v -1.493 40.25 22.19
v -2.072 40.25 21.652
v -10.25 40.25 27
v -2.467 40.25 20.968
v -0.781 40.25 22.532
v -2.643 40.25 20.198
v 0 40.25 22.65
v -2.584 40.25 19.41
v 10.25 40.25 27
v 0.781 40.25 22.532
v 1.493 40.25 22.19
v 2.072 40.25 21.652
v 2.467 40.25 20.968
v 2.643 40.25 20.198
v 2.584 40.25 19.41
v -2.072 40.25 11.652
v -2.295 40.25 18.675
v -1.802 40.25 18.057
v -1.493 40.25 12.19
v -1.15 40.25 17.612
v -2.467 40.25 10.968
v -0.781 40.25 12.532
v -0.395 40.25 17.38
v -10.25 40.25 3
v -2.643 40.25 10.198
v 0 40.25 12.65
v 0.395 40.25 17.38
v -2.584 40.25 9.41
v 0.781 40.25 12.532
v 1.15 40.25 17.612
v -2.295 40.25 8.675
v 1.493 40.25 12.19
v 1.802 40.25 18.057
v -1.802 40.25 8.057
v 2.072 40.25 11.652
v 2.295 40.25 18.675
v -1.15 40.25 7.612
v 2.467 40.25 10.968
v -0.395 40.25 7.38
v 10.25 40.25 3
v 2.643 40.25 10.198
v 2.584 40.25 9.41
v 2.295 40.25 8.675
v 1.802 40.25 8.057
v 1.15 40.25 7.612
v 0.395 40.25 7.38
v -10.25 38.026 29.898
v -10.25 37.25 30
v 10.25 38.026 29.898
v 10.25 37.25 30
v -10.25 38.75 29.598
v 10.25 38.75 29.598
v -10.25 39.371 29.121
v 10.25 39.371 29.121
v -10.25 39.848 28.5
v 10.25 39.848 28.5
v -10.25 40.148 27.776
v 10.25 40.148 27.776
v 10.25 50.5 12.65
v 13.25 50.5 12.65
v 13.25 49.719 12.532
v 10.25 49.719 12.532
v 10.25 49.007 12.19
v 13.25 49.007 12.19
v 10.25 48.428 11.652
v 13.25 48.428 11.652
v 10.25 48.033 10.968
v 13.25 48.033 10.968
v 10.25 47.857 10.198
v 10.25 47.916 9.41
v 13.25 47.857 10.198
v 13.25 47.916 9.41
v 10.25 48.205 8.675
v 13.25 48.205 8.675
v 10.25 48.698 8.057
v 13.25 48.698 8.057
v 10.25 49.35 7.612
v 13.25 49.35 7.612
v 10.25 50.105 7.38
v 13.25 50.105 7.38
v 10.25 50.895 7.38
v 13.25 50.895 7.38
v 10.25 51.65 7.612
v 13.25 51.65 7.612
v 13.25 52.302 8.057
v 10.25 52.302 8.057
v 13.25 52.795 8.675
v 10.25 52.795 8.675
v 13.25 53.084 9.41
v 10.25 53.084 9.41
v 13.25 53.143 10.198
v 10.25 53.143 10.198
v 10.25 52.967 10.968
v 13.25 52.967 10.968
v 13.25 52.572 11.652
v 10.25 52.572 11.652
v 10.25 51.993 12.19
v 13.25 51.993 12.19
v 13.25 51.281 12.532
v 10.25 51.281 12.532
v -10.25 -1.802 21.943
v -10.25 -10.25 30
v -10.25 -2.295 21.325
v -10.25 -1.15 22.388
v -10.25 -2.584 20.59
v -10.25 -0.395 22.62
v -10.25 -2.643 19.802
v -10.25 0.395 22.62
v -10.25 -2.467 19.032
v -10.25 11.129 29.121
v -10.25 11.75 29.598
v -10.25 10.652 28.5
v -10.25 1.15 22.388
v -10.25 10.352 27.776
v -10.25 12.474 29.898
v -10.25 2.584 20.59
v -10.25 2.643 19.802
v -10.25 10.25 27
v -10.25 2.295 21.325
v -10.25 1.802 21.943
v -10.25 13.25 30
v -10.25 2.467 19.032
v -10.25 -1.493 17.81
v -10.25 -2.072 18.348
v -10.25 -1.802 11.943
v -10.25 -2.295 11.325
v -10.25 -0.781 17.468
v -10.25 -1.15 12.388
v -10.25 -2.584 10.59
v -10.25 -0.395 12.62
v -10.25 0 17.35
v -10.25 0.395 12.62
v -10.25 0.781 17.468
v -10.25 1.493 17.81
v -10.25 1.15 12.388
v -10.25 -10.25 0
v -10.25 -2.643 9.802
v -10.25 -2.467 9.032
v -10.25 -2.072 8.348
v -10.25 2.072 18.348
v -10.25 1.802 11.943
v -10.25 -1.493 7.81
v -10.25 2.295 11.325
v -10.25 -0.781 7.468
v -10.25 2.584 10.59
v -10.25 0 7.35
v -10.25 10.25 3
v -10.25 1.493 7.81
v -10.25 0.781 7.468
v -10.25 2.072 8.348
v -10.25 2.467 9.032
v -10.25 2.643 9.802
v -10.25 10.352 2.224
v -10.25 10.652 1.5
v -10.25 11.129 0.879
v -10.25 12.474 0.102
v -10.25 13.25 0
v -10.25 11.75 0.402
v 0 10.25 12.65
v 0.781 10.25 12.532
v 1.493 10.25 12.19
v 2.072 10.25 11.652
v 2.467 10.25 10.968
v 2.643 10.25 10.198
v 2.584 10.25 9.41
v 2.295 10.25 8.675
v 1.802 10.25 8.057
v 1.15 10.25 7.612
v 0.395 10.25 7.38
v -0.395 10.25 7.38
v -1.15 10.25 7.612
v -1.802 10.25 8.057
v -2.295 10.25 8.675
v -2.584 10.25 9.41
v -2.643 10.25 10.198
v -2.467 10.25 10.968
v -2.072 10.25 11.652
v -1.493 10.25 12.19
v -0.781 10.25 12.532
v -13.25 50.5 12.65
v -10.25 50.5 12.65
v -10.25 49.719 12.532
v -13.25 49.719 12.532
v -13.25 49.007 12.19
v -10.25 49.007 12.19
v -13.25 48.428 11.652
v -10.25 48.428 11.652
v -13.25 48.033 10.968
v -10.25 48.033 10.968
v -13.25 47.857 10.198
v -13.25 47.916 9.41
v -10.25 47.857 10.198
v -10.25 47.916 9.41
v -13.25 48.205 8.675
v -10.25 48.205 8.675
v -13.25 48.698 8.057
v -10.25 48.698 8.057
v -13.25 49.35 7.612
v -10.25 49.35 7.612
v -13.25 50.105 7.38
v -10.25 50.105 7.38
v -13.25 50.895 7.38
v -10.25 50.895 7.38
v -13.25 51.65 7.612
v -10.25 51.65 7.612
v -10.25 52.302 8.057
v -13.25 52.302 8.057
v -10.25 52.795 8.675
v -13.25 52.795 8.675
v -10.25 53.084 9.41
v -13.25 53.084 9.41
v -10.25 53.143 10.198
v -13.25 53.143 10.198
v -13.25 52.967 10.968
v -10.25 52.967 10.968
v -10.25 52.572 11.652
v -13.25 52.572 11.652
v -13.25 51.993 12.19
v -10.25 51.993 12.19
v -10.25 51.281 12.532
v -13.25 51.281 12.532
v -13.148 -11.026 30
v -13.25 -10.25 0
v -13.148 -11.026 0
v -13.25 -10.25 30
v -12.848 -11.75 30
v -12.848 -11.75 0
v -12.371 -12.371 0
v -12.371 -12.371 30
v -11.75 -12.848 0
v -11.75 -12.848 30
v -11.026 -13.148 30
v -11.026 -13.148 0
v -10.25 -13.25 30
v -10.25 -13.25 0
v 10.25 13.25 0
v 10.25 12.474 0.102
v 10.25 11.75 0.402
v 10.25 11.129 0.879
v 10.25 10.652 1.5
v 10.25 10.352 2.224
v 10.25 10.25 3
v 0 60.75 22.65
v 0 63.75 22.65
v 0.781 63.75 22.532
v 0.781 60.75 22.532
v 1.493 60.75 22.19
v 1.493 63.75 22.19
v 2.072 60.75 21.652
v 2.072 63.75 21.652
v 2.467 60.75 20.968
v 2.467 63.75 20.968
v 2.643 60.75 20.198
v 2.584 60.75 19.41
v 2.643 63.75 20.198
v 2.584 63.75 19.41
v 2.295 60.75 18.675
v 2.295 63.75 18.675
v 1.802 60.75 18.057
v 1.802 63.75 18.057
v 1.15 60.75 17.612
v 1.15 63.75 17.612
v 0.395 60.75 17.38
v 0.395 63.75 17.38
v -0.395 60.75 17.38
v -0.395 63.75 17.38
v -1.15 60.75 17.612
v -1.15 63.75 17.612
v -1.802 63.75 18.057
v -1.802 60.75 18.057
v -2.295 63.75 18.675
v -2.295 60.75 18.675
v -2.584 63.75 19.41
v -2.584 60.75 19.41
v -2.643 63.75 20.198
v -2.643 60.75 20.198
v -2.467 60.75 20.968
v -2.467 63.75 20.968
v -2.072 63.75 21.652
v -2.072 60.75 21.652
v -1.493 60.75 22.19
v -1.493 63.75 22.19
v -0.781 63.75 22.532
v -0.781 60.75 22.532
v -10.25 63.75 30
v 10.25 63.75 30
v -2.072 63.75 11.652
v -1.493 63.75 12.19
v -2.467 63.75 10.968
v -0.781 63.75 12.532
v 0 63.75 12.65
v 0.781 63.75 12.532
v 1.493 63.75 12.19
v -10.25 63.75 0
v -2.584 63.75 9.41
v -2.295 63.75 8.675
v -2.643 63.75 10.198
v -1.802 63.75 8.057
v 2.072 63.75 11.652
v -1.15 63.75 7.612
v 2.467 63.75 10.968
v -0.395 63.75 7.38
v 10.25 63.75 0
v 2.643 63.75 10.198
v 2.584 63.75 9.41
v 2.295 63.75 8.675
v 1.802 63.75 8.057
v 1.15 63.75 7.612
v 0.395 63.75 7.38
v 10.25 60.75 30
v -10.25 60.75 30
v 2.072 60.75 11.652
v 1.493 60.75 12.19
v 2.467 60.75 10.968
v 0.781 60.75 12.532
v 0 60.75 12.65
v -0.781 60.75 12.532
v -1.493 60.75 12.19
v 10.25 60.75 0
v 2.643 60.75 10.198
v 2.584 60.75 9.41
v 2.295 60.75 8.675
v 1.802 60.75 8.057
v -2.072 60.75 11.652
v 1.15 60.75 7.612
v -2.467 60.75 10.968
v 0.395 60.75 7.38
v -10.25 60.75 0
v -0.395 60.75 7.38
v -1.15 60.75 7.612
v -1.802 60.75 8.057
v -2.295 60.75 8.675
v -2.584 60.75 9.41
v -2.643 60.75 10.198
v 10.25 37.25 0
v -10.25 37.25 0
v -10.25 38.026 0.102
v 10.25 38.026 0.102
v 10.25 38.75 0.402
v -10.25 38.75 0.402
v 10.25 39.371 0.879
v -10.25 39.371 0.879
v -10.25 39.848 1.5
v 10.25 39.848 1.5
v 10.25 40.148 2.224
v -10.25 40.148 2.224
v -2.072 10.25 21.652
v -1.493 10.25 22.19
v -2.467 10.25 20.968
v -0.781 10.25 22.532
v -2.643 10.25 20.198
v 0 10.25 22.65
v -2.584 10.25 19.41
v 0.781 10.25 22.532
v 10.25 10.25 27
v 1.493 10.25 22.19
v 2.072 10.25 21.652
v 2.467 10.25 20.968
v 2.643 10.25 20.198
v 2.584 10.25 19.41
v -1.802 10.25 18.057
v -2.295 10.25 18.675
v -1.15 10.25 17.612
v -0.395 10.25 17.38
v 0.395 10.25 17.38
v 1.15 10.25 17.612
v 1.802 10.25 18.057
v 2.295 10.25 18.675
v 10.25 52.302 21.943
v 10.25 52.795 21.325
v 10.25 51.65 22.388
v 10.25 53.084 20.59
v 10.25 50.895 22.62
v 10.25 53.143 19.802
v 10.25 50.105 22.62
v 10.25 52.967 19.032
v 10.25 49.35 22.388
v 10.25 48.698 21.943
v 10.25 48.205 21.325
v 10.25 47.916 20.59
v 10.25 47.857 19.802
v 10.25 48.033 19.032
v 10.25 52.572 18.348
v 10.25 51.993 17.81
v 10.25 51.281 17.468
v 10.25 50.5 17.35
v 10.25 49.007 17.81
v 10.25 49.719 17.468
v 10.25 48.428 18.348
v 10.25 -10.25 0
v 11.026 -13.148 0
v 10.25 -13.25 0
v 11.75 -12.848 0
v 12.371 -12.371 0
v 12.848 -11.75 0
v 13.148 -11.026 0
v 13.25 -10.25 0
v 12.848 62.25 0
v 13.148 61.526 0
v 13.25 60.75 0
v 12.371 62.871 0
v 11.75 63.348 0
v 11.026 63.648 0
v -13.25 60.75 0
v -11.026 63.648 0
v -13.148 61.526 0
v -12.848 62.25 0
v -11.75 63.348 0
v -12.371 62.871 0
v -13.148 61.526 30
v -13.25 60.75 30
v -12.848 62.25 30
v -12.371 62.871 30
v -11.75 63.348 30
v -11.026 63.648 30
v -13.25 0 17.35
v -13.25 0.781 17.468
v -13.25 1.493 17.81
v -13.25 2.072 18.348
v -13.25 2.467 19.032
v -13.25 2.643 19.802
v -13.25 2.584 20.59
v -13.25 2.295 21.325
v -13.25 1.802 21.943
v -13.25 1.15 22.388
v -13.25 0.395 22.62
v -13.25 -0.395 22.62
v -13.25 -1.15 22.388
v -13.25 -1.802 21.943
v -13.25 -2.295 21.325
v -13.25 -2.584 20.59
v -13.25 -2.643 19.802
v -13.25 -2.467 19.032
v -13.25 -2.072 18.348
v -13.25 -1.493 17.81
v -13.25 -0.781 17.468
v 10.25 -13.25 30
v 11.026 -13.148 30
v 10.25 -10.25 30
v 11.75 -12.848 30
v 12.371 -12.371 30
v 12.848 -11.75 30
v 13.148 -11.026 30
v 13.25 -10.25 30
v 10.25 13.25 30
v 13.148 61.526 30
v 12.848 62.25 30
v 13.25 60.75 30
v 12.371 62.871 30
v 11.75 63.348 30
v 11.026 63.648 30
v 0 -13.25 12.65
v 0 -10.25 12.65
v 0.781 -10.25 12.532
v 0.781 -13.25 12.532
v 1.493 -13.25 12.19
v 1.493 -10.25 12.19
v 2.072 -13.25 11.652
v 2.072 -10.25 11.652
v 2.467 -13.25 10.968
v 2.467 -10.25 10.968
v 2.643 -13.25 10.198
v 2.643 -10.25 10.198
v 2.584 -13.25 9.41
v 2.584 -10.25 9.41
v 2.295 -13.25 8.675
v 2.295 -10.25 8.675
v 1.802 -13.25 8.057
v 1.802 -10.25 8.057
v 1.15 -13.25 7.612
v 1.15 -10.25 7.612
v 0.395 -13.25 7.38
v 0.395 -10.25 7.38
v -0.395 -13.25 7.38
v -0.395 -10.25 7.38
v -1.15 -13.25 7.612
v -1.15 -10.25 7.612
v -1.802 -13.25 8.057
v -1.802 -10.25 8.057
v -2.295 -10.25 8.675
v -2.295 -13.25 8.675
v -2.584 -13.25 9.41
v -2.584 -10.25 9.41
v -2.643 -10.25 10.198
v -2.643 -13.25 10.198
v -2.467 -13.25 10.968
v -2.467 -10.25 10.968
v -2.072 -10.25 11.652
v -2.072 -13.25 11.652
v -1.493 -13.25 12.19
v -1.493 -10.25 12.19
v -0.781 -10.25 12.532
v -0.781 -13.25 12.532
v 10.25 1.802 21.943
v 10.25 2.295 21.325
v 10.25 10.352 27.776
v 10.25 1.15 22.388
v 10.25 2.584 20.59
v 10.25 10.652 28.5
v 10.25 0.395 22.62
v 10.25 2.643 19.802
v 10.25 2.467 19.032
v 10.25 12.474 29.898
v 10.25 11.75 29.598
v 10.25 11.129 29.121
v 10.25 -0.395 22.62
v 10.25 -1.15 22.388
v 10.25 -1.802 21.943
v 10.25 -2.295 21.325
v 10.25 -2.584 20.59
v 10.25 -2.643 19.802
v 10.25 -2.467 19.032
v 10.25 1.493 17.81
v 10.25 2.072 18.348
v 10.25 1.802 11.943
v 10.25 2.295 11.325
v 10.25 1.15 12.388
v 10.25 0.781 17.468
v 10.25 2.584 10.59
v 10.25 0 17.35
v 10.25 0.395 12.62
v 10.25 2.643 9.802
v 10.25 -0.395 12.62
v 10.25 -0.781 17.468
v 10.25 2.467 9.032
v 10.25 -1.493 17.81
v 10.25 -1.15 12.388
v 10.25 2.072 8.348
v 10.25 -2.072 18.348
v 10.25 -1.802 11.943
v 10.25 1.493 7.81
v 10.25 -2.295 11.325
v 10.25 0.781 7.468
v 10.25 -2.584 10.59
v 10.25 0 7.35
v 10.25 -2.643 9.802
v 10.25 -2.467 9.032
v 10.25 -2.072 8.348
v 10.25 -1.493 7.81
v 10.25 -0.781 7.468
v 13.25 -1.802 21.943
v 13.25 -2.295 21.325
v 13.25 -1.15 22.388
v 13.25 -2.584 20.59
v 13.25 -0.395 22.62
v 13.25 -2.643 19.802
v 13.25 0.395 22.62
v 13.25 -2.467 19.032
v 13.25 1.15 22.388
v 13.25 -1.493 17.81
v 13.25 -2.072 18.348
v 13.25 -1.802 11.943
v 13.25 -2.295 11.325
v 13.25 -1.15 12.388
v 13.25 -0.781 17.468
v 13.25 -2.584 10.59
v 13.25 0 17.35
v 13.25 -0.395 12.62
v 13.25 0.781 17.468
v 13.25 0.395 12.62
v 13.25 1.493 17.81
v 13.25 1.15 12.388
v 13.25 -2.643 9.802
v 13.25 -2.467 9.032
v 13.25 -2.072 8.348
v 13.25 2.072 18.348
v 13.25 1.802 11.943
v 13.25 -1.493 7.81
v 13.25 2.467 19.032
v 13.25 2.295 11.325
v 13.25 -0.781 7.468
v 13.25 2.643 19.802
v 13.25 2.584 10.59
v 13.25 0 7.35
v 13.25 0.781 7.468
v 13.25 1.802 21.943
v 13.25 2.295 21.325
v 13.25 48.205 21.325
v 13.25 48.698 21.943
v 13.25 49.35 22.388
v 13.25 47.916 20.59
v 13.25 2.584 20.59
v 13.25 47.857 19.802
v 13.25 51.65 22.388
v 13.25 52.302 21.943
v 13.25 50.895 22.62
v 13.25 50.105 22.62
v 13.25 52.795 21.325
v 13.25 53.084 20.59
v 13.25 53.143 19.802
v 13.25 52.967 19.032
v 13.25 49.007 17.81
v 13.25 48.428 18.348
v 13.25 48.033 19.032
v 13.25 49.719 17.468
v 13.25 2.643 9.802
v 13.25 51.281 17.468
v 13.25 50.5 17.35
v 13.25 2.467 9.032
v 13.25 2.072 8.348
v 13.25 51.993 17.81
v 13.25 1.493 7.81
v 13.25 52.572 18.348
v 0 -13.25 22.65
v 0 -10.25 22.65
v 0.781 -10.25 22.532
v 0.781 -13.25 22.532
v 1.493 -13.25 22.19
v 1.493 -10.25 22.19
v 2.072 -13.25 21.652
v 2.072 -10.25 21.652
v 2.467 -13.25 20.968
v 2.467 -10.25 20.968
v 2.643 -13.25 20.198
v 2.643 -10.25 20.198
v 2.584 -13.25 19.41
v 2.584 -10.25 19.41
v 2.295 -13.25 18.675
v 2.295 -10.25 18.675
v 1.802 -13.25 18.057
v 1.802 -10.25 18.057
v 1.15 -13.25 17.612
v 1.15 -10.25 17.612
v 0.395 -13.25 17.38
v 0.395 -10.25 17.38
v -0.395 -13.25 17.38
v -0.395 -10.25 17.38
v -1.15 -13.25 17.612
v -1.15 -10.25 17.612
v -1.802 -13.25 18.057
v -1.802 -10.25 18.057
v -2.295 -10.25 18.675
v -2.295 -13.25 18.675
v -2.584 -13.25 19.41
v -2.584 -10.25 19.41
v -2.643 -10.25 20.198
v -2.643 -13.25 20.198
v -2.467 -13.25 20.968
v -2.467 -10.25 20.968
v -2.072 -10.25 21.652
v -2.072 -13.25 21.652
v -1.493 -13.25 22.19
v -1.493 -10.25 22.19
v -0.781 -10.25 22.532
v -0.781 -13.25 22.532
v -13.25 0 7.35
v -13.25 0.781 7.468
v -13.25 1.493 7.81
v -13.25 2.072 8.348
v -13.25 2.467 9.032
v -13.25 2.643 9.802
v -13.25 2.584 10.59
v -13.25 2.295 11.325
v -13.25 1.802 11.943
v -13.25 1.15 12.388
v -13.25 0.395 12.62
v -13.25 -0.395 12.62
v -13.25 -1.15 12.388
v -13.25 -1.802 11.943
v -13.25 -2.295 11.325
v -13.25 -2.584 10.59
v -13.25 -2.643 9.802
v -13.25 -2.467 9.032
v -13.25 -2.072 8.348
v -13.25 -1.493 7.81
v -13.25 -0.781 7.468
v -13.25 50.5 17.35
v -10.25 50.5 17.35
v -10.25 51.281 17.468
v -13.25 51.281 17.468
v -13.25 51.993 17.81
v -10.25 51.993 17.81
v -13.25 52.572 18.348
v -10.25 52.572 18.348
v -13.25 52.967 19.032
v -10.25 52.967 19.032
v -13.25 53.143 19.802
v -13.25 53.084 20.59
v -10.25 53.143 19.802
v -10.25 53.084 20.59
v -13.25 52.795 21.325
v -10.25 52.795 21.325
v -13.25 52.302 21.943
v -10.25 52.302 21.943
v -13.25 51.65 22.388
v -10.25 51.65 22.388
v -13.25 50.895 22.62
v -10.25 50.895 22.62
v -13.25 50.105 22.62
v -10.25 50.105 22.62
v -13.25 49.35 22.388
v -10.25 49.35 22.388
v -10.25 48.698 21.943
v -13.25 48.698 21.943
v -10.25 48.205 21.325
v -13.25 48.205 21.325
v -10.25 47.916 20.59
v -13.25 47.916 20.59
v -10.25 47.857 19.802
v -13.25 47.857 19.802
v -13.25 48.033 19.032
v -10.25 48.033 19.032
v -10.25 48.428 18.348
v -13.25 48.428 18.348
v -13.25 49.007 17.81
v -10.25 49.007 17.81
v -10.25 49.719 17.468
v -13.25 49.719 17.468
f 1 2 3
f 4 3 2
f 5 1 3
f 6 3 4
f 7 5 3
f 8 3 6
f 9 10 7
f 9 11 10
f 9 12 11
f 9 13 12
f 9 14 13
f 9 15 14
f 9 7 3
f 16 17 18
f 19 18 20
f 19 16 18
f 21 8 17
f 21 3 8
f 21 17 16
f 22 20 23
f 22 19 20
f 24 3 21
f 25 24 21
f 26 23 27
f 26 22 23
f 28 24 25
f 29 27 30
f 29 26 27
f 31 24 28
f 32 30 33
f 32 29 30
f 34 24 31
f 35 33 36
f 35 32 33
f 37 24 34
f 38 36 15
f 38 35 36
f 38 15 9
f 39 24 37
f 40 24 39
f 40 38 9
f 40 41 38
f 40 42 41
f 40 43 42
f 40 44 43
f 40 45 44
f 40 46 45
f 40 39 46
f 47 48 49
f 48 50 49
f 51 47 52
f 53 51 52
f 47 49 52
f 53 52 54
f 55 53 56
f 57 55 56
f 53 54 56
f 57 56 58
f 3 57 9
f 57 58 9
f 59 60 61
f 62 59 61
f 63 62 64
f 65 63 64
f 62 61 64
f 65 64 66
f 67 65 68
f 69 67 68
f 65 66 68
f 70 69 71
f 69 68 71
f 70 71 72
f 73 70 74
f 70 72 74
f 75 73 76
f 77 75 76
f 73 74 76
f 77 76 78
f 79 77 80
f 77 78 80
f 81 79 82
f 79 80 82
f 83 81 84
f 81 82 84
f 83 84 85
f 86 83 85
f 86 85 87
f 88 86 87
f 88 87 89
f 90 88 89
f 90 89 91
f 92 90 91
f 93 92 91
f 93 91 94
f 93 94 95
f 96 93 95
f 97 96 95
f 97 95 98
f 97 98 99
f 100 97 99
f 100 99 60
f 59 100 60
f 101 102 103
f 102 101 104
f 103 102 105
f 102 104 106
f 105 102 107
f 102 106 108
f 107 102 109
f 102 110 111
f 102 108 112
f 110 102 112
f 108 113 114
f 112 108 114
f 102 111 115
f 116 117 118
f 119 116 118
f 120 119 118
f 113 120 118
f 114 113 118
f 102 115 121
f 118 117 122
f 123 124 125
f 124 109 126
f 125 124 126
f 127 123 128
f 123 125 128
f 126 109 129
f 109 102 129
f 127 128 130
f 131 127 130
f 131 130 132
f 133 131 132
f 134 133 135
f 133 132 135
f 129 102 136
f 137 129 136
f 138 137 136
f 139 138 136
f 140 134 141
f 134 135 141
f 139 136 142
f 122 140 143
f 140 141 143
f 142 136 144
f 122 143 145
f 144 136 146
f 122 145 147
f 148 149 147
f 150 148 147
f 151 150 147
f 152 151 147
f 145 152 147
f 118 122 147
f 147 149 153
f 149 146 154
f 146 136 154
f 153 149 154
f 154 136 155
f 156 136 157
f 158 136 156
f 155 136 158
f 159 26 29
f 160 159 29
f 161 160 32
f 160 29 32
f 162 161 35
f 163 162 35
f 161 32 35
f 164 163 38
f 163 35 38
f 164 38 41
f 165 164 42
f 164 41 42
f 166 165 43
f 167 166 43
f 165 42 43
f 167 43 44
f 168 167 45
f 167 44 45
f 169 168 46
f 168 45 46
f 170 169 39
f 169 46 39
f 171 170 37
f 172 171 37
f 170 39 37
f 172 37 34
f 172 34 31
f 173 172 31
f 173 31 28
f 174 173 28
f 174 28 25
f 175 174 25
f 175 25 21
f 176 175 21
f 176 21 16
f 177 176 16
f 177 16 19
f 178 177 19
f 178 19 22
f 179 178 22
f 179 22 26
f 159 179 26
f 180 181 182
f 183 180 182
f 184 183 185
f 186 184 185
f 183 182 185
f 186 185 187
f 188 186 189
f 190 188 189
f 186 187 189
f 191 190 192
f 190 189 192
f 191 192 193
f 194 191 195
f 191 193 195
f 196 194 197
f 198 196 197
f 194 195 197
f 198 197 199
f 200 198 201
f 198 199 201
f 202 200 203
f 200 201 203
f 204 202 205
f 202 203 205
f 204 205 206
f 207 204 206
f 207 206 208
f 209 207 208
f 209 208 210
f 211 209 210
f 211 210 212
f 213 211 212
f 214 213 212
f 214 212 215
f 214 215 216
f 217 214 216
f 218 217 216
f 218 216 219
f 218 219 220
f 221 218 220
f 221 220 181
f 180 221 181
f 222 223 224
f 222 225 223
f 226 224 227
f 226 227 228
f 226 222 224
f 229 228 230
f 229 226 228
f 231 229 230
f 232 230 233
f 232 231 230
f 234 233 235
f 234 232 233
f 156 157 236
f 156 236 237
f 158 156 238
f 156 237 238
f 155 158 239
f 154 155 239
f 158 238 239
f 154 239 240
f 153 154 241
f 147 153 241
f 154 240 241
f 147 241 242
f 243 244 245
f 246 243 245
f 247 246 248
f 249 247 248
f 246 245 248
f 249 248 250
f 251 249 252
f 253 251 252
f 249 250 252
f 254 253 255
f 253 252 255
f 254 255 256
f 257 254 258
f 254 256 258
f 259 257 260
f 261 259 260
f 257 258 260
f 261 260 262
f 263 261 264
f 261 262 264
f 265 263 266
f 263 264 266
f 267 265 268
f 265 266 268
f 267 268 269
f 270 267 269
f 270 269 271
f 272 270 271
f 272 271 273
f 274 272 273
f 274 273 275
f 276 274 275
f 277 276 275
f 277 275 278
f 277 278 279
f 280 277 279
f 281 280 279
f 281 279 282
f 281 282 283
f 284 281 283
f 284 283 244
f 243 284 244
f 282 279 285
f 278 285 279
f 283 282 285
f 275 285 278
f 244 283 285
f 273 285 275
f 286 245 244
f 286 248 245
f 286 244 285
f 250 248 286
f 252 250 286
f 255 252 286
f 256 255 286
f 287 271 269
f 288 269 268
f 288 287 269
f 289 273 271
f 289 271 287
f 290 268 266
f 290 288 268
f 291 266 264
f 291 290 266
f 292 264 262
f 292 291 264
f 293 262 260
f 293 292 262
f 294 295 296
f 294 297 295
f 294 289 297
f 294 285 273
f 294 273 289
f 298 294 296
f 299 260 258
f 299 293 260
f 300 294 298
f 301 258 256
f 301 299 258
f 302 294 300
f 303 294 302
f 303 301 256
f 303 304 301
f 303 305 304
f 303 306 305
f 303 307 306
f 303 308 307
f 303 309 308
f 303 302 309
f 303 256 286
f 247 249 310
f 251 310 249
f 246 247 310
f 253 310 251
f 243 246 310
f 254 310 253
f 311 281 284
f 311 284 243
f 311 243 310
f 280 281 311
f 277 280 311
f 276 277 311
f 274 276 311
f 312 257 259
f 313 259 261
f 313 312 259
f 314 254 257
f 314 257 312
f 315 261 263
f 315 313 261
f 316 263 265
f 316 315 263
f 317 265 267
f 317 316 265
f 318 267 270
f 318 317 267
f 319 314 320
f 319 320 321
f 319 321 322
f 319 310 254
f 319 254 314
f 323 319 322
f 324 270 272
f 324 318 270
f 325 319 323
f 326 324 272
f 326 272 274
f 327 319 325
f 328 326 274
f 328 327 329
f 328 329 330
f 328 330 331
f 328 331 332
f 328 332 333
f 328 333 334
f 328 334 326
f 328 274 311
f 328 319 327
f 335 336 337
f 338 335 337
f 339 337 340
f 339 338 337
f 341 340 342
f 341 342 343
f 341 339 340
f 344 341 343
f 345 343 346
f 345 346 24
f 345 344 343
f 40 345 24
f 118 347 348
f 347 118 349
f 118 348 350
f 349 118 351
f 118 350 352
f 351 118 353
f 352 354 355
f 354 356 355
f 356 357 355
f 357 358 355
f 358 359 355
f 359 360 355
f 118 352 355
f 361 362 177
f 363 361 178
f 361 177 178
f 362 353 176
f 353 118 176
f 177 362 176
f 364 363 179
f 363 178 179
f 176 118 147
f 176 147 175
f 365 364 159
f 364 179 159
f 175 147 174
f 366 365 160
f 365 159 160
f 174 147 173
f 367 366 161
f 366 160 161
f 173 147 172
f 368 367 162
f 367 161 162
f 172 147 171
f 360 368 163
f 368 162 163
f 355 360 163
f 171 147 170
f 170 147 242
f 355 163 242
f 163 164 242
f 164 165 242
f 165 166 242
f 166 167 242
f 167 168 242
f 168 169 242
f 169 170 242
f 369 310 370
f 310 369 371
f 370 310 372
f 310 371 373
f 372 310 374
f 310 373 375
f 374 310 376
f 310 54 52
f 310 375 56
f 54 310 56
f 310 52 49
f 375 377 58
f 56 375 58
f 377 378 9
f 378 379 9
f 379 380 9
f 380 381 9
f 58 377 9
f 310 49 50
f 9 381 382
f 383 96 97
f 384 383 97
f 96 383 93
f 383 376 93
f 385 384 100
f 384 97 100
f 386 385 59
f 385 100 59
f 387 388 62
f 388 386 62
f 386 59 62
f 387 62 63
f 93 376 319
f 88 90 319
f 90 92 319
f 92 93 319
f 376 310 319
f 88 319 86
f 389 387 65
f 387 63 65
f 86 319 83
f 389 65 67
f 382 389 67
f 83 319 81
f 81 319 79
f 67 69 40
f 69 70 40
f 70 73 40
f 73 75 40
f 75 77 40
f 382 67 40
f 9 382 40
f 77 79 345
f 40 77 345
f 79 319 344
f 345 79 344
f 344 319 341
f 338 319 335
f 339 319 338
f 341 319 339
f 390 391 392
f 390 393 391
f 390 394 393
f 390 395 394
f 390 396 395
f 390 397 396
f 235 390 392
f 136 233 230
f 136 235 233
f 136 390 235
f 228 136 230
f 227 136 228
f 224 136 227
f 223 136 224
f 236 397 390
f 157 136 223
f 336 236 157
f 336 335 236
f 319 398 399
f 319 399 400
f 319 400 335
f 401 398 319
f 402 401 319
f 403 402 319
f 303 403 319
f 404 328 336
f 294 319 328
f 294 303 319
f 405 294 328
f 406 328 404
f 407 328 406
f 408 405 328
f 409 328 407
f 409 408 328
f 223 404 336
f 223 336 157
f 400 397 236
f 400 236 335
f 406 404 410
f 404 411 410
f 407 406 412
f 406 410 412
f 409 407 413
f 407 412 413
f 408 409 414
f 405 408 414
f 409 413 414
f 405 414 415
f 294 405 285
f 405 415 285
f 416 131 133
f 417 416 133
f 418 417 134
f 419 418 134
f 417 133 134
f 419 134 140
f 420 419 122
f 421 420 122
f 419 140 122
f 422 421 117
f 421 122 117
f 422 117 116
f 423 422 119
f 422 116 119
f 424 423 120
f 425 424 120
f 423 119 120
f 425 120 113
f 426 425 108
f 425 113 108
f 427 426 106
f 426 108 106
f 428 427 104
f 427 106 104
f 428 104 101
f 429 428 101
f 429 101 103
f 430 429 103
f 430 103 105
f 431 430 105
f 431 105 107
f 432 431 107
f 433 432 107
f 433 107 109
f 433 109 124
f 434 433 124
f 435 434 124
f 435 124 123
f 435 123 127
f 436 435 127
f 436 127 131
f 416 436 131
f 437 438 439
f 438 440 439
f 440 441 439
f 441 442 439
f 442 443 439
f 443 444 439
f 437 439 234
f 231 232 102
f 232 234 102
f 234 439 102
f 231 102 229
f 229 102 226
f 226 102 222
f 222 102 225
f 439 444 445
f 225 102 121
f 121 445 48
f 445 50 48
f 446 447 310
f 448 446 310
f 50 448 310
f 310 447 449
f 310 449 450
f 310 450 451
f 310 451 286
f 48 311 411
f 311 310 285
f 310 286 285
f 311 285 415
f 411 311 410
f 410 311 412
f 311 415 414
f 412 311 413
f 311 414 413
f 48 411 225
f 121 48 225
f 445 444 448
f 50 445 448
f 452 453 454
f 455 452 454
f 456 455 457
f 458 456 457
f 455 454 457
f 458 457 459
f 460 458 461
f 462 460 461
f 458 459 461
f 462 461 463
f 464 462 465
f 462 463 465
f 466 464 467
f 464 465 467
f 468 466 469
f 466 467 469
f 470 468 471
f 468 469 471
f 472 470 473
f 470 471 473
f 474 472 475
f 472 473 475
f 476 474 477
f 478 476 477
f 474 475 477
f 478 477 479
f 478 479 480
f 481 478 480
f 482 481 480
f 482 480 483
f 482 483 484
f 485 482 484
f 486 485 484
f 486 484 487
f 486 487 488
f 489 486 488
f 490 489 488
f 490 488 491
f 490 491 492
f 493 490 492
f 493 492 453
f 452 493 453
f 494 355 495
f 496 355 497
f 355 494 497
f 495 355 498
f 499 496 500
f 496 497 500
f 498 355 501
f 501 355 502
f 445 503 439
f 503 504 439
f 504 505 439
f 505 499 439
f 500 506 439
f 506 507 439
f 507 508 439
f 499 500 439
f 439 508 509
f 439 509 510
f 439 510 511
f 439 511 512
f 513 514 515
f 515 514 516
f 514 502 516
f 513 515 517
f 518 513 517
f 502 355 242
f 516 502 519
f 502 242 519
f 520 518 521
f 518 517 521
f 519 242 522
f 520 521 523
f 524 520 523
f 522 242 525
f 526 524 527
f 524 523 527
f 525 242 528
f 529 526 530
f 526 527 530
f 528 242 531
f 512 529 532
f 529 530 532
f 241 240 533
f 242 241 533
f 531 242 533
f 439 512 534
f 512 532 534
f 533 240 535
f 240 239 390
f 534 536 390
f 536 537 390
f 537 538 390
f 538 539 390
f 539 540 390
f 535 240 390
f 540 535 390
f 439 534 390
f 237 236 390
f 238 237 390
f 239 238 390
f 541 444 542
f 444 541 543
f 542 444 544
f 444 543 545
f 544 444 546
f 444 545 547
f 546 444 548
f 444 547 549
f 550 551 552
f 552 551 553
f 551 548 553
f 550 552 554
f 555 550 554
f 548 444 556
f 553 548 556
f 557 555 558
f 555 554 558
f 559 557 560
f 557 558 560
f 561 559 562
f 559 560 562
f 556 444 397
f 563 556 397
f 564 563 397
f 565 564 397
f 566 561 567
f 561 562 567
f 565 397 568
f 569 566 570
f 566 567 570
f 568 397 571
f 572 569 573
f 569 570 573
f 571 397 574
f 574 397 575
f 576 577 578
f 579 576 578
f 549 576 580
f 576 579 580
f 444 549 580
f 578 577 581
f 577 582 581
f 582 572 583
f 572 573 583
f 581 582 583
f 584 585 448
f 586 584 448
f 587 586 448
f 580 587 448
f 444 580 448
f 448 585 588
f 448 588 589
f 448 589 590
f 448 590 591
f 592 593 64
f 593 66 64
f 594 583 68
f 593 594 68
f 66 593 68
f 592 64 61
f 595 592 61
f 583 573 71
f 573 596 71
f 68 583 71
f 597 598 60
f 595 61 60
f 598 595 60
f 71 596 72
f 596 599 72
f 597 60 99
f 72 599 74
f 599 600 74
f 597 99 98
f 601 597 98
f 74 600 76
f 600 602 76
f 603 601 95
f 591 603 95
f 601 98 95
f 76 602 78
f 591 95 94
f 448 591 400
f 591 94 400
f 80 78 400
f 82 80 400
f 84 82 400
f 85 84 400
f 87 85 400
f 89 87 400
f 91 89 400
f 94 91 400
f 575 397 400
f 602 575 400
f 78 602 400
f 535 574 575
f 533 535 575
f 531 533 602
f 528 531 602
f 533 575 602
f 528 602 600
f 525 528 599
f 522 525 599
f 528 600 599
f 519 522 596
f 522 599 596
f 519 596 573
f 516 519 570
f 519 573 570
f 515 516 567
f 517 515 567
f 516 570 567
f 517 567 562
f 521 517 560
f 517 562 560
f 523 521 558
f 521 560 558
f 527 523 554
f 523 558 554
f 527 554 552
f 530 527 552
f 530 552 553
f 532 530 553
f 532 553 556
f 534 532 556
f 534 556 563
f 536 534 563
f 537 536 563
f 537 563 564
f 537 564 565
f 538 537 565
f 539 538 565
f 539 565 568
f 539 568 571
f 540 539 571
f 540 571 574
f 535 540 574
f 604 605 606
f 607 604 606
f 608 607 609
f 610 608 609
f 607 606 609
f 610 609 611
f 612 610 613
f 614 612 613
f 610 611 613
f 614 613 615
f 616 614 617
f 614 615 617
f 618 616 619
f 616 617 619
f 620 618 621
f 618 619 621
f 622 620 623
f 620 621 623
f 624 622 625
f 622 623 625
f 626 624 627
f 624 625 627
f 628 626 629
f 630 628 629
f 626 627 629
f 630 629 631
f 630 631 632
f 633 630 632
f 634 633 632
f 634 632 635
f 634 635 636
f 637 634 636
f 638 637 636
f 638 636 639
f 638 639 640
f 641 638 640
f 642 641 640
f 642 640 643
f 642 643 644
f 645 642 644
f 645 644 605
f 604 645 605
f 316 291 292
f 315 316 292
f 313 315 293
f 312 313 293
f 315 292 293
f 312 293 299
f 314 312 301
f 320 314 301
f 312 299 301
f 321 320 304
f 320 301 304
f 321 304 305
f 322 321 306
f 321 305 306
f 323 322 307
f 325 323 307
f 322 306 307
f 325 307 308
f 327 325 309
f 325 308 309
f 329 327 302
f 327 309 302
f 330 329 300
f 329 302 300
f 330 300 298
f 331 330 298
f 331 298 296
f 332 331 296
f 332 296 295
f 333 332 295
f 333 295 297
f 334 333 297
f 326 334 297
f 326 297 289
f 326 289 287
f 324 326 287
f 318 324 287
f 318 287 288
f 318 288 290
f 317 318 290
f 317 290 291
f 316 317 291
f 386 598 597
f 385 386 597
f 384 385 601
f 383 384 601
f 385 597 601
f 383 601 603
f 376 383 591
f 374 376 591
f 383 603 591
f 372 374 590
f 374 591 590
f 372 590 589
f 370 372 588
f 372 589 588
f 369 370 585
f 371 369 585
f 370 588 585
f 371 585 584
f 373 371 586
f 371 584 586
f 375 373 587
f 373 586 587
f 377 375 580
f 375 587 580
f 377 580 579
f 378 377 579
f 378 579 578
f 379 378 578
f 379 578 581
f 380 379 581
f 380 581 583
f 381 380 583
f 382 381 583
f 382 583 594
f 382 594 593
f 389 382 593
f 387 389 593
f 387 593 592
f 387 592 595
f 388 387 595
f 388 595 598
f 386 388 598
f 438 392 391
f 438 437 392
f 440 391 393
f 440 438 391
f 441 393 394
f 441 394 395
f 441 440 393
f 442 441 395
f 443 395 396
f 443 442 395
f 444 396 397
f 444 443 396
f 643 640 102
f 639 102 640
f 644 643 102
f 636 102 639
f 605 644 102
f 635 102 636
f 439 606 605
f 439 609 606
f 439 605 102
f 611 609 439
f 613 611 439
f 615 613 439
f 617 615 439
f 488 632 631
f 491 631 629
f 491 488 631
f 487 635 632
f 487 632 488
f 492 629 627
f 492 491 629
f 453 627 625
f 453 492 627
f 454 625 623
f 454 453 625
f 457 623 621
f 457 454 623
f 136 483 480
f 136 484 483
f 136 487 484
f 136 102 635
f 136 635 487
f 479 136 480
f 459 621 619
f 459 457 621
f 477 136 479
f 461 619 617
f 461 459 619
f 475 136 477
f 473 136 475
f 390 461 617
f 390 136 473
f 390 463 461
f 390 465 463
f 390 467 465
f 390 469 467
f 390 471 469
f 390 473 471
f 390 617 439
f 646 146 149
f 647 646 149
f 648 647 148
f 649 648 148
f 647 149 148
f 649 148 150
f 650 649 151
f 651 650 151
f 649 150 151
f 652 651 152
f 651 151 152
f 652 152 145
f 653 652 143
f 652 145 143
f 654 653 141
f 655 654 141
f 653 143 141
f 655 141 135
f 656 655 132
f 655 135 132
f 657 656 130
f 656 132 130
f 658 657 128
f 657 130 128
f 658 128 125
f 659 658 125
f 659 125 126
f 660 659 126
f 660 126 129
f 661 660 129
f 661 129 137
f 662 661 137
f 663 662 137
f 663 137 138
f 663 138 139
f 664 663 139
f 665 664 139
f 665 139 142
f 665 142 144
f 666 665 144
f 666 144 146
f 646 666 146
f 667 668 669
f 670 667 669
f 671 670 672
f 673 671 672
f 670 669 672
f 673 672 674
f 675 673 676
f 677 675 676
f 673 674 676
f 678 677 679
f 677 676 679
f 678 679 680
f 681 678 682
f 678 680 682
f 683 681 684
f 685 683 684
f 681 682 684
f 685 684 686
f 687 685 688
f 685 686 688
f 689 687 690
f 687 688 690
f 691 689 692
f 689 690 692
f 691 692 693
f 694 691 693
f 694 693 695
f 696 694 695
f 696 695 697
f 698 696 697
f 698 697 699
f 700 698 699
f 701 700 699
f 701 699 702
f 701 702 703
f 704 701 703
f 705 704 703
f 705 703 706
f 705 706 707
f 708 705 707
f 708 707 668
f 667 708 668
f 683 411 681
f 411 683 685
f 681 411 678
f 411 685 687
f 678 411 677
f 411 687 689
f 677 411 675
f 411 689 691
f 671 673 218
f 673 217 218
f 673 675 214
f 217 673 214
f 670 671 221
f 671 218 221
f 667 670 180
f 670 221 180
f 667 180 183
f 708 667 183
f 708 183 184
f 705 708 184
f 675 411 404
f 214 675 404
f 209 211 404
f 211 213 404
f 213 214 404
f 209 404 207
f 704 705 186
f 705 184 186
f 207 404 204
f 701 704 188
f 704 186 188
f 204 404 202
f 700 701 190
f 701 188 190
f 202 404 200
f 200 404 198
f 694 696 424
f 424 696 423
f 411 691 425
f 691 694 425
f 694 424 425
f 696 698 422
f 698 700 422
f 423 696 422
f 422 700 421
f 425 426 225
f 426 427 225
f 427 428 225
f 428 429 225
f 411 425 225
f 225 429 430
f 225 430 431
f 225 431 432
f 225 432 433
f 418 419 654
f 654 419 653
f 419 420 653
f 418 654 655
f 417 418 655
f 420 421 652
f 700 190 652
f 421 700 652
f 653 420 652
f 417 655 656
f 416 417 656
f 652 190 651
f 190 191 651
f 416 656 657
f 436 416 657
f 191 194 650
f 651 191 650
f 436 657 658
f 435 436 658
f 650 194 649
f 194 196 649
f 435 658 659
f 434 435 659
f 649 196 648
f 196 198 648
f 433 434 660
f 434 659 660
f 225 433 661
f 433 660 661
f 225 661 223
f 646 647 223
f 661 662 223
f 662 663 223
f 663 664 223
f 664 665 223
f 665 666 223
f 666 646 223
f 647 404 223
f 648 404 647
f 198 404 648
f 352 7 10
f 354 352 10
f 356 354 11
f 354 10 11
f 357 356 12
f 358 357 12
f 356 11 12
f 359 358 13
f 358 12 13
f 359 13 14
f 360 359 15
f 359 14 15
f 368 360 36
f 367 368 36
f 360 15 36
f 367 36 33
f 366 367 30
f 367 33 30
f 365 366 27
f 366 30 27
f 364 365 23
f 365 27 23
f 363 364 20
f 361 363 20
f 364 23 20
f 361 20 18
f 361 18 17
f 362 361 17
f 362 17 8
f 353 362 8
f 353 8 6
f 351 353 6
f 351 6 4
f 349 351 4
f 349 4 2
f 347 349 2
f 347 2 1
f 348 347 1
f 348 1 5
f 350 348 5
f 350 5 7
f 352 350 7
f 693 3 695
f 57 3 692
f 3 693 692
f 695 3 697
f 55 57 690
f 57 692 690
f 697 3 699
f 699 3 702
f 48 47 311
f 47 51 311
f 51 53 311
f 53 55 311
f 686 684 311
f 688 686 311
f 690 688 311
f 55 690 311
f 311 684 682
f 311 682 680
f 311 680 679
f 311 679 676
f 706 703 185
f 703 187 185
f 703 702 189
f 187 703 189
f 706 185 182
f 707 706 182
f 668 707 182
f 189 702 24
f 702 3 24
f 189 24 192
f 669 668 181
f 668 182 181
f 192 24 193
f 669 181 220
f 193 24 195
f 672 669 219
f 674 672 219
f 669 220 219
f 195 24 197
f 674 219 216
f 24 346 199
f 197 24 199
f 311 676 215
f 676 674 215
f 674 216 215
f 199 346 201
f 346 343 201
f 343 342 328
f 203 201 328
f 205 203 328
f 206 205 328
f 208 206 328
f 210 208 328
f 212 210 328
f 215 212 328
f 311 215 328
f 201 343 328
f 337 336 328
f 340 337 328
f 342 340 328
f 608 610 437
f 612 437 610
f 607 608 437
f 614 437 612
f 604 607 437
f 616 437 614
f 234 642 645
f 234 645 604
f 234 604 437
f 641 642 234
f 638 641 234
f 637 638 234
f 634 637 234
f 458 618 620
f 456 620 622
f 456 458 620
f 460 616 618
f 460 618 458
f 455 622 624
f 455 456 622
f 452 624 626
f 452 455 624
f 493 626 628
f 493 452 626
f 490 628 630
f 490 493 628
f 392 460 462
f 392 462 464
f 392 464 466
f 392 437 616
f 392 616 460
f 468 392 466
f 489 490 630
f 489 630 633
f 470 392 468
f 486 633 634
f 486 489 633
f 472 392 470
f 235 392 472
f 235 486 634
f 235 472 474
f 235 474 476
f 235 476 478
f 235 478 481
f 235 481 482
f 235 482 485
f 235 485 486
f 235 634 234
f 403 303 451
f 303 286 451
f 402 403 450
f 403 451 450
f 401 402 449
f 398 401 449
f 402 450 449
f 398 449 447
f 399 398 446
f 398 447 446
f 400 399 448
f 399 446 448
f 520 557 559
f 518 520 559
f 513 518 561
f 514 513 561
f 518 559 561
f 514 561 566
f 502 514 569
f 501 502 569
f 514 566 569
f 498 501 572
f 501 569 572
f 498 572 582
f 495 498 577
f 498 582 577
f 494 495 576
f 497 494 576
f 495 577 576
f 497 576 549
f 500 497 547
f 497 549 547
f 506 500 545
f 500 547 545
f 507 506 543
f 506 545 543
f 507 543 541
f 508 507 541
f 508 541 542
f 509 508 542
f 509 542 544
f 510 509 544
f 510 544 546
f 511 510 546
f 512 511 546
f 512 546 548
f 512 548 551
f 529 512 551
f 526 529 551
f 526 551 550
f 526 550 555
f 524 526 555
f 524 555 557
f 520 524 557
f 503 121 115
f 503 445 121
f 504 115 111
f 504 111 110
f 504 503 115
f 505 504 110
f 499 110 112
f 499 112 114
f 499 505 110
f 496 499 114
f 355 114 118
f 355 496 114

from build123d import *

# Parameters (mm, degrees)
SKETCH_1_W          = 20.5
SKETCH_1_H          = 30
EXTRUDE_1_DEPTH     = 30
FILLET_1_R          = 3
SKETCH_2_R          = 2.65
CUT_EXTRUDE_1_DEPTH = 84.693264365
SKETCH_3_R          = 2.65
CUT_EXTRUDE_2_DEPTH = 76.27491282
FILLET_2_R          = 3


with BuildPart() as part:
    # 草图1 → 凸台-拉伸1 (new body)
    # profile 1 of 2: a face of its own
    with BuildSketch(Plane.XY):
        Polygon((-13.25, -13.25), (-13.25, 10.25), (-13.25, 40.25), (-13.25, 63.75), (13.25, 63.75), (13.25, 40.25), (13.25, 10.25), (13.25, -13.25), align=None)
        Polygon((10.25, 40.25), (10.25, 60.75), (-10.25, 60.75), (-10.25, 40.25), (-10.25, 10.25), (-10.25, -10.25), (10.25, -10.25), (10.25, 10.25), align=None, mode=Mode.SUBTRACT)
    # profile 2 of 2: a face of its own
    with BuildSketch(Plane.XY):
        with Locations((0, 25.25)):
            Rectangle(SKETCH_1_W, SKETCH_1_H)
    extrude(amount=EXTRUDE_1_DEPTH)

    # 圆角1
    fillet_1_edges = [part.edges().sort_by_distance(p)[0] for p in [
        (-13.25, 63.75, 15),
        (13.25, 63.75, 15),
        (13.25, -13.25, 15),
        (-13.25, -13.25, 15),
    ]]
    fillet(fillet_1_edges, radius=FILLET_1_R)

    # 草图2 → 切除-拉伸1 (cut, through all)
    with BuildSketch(Plane(origin=(0, 63.75, 0), x_dir=(1, 0, 0), z_dir=(0, 1, 0))):
        with Locations(Location((0, -10, 0), (0, 0, 270))):
            Circle(SKETCH_2_R)
        with Locations(Location((0, -20, 0), (0, 0, 270))):
            Circle(SKETCH_2_R)
    extrude(amount=-CUT_EXTRUDE_1_DEPTH, mode=Mode.SUBTRACT)

    # 草图3 → 切除-拉伸2 (cut, through all)
    with BuildSketch(Plane(origin=(13.25, 0, 0), x_dir=(0, 0, -1), z_dir=(1, 0, 0))):
        with Locations((-10, 0)):
            Circle(SKETCH_3_R)
        with Locations((-20, 0)):
            Circle(SKETCH_3_R)
        with Locations(Location((-10, 50.5, 0), (0, 0, 180))):
            Circle(SKETCH_3_R)
        with Locations((-20, 50.5)):
            Circle(SKETCH_3_R)
    extrude(amount=-CUT_EXTRUDE_2_DEPTH, mode=Mode.SUBTRACT)

    # 圆角2
    fillet_2_edges = [part.edges().sort_by_distance(p)[0] for p in [
        (0, 40.25, 30),
        (0, 10.25, 0),
        (0, 40.25, 0),
        (0, 10.25, 30),
    ]]
    fillet(fillet_2_edges, radius=FILLET_2_R)


solid = part.part
